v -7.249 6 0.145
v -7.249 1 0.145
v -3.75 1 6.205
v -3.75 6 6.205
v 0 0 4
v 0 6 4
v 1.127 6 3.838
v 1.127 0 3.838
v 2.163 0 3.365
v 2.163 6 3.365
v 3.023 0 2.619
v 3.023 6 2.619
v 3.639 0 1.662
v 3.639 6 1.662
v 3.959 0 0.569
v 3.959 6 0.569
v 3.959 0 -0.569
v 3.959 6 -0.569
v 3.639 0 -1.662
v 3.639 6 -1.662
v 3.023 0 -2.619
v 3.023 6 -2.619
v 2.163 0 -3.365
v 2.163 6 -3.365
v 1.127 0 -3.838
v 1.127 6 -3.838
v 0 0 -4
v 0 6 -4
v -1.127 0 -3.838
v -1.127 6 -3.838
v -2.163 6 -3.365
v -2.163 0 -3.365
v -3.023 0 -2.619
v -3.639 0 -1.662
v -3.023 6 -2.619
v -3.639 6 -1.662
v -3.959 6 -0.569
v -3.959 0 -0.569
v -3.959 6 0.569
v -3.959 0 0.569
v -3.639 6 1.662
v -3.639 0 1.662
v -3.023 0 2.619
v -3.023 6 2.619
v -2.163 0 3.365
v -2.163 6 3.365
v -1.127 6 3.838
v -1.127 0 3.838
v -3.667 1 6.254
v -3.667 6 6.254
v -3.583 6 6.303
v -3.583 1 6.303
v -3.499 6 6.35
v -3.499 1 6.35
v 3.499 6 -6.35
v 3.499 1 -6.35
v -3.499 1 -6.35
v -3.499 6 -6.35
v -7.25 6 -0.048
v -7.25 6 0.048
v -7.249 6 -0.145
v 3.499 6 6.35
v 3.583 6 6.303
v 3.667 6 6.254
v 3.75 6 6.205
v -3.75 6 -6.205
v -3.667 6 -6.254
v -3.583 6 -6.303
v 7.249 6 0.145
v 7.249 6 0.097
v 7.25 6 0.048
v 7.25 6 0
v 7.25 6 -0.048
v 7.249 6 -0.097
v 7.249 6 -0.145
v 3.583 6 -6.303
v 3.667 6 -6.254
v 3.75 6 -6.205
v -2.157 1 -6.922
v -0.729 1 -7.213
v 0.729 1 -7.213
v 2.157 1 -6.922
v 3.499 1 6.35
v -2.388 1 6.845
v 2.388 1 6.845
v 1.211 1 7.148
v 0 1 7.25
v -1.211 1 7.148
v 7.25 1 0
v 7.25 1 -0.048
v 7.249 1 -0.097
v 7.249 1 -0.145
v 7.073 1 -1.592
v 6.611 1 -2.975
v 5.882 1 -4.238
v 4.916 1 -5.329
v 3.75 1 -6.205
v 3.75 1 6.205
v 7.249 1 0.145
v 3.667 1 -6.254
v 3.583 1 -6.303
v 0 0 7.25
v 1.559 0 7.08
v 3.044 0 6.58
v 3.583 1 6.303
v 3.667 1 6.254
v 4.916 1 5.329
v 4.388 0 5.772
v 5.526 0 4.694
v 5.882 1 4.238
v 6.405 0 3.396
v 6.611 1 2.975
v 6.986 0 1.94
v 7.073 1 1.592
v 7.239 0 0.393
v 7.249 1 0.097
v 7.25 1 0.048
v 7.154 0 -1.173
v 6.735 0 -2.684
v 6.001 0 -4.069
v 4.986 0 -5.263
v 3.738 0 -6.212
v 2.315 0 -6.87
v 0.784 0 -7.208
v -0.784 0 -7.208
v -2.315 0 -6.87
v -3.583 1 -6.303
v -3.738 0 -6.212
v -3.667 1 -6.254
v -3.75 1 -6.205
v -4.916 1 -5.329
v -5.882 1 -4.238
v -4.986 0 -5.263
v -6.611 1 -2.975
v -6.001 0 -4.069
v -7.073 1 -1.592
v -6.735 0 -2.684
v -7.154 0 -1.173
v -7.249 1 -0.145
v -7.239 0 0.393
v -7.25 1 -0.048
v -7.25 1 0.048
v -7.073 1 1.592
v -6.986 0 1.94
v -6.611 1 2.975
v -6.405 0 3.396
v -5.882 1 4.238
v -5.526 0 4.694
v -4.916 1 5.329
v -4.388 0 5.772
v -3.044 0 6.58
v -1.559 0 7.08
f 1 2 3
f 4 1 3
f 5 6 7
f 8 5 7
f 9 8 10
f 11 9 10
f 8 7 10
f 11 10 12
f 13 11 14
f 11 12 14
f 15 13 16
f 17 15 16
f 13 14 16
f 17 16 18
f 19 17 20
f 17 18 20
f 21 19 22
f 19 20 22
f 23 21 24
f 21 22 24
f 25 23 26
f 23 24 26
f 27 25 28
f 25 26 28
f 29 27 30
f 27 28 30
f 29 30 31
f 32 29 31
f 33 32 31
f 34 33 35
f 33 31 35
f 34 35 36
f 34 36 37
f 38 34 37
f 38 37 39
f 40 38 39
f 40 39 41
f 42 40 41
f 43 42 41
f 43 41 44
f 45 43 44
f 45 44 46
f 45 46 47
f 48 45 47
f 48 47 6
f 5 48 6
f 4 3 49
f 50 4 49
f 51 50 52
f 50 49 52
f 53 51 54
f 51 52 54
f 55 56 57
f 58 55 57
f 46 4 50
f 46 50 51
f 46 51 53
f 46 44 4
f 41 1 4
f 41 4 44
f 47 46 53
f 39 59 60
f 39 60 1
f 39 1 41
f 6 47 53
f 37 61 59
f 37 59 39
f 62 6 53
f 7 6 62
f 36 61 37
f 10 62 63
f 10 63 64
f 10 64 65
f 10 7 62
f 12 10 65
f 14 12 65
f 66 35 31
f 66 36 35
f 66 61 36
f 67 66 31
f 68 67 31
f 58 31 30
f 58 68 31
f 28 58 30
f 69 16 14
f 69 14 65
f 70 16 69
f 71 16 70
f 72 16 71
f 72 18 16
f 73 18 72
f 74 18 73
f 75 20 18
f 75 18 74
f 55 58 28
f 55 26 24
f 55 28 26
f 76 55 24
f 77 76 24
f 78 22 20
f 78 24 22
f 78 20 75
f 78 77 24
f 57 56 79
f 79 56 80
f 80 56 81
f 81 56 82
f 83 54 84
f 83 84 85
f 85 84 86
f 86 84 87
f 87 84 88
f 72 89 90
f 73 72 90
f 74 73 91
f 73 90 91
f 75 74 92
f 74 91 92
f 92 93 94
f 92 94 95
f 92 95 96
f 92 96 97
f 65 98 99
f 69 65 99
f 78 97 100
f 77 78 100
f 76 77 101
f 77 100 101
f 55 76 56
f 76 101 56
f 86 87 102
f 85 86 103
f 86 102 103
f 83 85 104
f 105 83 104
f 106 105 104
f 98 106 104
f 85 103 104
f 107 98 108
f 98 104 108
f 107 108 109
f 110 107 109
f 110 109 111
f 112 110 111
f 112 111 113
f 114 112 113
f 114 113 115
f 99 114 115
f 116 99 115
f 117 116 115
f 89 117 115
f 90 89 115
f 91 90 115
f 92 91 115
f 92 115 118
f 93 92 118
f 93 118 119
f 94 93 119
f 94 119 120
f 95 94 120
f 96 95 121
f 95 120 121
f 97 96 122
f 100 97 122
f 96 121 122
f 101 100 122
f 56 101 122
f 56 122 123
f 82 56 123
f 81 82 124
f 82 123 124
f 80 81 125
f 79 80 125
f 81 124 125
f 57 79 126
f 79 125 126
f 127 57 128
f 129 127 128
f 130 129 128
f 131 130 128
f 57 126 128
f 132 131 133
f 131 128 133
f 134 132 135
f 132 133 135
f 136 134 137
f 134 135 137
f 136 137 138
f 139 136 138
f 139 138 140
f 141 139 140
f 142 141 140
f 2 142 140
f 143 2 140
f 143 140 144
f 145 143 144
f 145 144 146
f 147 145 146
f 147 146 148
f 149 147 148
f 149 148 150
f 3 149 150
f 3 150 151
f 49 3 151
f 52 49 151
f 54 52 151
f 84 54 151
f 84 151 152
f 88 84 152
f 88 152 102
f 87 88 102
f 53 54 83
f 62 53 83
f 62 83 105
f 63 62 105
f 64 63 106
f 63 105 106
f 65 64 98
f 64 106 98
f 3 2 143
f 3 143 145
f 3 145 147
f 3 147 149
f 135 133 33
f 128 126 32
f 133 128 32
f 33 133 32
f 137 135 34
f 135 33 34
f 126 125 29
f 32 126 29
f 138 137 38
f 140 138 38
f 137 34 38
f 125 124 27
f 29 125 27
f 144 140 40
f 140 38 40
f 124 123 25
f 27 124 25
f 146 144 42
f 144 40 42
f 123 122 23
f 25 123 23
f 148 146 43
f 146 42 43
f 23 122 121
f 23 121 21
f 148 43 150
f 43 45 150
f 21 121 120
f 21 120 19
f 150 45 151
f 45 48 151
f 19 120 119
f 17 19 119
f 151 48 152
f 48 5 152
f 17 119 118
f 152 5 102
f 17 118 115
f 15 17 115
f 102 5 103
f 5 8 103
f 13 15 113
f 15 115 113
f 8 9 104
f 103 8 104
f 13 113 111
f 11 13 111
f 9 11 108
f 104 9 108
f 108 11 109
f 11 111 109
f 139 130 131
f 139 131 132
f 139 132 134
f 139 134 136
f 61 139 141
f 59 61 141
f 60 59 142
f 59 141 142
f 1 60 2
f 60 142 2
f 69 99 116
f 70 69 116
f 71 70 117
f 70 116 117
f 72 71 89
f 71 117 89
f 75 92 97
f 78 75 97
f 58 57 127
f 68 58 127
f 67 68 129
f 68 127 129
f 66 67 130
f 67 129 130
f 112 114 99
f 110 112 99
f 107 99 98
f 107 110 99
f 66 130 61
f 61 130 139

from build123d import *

# Parameters (mm, degrees)
SKETCH1_R           = 7.25
BOSS_EXTRUDE1_DEPTH = 1
BOSS_EXTRUDE2_DEPTH = 5
SKETCH3_R           = 4
CUT_EXTRUDE1_DEPTH  = 12.879604371


with BuildPart() as part:
    # Sketch1 → Boss-Extrude1 (new body)
    with BuildSketch(Plane(origin=(0, 0, 0), x_dir=(1, 0, 0), z_dir=(0, 1, 0))):
        with Locations(Location((0, 0, 0), (0, 0, 270))):
            Circle(SKETCH1_R)
    extrude(amount=BOSS_EXTRUDE1_DEPTH)

    # Sketch2 → Boss-Extrude2 (add)
    with BuildSketch(Plane(origin=(0, 1, 0), x_dir=(1, 0, 0), z_dir=(0, 1, 0))):
        with BuildLine():
            ThreePointArc((3.749975746, 6.204851482), (3.625, 6.278684177), (3.498571137, 6.35))
            Line((3.498571137, 6.35), (-3.498571137, 6.35))
            ThreePointArc((-3.498571137, 6.35), (-3.625, 6.278684177), (-3.749975746, 6.204851482))
            Line((-3.749975746, 6.204851482), (-7.248546882, 0.145148518))
            ThreePointArc((-7.248546882, 0.145148518), (-7.25, 0), (-7.248546882, -0.145148518))
            Line((-7.248546882, -0.145148518), (-3.749975746, -6.204851482))
            ThreePointArc((-3.749975746, -6.204851482), (-3.625, -6.278684177), (-3.498571137, -6.35))
            Line((-3.498571137, -6.35), (3.498571137, -6.35))
            ThreePointArc((3.498571137, -6.35), (3.625, -6.278684177), (3.749975746, -6.204851482))
            Line((3.749975746, -6.204851482), (7.248546882, -0.145148518))
            ThreePointArc((7.248546882, -0.145148518), (7.249636712, -0.072577896), (7.25, 0))
            ThreePointArc((7.25, 0), (7.249636712, 0.072577896), (7.248546882, 0.145148518))
            Line((7.248546882, 0.145148518), (3.749975746, 6.204851482))
        make_face()
    extrude(amount=BOSS_EXTRUDE2_DEPTH)

    # Sketch3 → Cut-Extrude1 (cut, through all)
    with BuildSketch(Plane(origin=(0, 6, 0), x_dir=(1, 0, 0), z_dir=(0, 1, 0))):
        with Locations(Location((0, 0, 0), (0, 0, 270))):
            Circle(SKETCH3_R)
    extrude(amount=-CUT_EXTRUDE1_DEPTH, mode=Mode.SUBTRACT)


solid = part.part
